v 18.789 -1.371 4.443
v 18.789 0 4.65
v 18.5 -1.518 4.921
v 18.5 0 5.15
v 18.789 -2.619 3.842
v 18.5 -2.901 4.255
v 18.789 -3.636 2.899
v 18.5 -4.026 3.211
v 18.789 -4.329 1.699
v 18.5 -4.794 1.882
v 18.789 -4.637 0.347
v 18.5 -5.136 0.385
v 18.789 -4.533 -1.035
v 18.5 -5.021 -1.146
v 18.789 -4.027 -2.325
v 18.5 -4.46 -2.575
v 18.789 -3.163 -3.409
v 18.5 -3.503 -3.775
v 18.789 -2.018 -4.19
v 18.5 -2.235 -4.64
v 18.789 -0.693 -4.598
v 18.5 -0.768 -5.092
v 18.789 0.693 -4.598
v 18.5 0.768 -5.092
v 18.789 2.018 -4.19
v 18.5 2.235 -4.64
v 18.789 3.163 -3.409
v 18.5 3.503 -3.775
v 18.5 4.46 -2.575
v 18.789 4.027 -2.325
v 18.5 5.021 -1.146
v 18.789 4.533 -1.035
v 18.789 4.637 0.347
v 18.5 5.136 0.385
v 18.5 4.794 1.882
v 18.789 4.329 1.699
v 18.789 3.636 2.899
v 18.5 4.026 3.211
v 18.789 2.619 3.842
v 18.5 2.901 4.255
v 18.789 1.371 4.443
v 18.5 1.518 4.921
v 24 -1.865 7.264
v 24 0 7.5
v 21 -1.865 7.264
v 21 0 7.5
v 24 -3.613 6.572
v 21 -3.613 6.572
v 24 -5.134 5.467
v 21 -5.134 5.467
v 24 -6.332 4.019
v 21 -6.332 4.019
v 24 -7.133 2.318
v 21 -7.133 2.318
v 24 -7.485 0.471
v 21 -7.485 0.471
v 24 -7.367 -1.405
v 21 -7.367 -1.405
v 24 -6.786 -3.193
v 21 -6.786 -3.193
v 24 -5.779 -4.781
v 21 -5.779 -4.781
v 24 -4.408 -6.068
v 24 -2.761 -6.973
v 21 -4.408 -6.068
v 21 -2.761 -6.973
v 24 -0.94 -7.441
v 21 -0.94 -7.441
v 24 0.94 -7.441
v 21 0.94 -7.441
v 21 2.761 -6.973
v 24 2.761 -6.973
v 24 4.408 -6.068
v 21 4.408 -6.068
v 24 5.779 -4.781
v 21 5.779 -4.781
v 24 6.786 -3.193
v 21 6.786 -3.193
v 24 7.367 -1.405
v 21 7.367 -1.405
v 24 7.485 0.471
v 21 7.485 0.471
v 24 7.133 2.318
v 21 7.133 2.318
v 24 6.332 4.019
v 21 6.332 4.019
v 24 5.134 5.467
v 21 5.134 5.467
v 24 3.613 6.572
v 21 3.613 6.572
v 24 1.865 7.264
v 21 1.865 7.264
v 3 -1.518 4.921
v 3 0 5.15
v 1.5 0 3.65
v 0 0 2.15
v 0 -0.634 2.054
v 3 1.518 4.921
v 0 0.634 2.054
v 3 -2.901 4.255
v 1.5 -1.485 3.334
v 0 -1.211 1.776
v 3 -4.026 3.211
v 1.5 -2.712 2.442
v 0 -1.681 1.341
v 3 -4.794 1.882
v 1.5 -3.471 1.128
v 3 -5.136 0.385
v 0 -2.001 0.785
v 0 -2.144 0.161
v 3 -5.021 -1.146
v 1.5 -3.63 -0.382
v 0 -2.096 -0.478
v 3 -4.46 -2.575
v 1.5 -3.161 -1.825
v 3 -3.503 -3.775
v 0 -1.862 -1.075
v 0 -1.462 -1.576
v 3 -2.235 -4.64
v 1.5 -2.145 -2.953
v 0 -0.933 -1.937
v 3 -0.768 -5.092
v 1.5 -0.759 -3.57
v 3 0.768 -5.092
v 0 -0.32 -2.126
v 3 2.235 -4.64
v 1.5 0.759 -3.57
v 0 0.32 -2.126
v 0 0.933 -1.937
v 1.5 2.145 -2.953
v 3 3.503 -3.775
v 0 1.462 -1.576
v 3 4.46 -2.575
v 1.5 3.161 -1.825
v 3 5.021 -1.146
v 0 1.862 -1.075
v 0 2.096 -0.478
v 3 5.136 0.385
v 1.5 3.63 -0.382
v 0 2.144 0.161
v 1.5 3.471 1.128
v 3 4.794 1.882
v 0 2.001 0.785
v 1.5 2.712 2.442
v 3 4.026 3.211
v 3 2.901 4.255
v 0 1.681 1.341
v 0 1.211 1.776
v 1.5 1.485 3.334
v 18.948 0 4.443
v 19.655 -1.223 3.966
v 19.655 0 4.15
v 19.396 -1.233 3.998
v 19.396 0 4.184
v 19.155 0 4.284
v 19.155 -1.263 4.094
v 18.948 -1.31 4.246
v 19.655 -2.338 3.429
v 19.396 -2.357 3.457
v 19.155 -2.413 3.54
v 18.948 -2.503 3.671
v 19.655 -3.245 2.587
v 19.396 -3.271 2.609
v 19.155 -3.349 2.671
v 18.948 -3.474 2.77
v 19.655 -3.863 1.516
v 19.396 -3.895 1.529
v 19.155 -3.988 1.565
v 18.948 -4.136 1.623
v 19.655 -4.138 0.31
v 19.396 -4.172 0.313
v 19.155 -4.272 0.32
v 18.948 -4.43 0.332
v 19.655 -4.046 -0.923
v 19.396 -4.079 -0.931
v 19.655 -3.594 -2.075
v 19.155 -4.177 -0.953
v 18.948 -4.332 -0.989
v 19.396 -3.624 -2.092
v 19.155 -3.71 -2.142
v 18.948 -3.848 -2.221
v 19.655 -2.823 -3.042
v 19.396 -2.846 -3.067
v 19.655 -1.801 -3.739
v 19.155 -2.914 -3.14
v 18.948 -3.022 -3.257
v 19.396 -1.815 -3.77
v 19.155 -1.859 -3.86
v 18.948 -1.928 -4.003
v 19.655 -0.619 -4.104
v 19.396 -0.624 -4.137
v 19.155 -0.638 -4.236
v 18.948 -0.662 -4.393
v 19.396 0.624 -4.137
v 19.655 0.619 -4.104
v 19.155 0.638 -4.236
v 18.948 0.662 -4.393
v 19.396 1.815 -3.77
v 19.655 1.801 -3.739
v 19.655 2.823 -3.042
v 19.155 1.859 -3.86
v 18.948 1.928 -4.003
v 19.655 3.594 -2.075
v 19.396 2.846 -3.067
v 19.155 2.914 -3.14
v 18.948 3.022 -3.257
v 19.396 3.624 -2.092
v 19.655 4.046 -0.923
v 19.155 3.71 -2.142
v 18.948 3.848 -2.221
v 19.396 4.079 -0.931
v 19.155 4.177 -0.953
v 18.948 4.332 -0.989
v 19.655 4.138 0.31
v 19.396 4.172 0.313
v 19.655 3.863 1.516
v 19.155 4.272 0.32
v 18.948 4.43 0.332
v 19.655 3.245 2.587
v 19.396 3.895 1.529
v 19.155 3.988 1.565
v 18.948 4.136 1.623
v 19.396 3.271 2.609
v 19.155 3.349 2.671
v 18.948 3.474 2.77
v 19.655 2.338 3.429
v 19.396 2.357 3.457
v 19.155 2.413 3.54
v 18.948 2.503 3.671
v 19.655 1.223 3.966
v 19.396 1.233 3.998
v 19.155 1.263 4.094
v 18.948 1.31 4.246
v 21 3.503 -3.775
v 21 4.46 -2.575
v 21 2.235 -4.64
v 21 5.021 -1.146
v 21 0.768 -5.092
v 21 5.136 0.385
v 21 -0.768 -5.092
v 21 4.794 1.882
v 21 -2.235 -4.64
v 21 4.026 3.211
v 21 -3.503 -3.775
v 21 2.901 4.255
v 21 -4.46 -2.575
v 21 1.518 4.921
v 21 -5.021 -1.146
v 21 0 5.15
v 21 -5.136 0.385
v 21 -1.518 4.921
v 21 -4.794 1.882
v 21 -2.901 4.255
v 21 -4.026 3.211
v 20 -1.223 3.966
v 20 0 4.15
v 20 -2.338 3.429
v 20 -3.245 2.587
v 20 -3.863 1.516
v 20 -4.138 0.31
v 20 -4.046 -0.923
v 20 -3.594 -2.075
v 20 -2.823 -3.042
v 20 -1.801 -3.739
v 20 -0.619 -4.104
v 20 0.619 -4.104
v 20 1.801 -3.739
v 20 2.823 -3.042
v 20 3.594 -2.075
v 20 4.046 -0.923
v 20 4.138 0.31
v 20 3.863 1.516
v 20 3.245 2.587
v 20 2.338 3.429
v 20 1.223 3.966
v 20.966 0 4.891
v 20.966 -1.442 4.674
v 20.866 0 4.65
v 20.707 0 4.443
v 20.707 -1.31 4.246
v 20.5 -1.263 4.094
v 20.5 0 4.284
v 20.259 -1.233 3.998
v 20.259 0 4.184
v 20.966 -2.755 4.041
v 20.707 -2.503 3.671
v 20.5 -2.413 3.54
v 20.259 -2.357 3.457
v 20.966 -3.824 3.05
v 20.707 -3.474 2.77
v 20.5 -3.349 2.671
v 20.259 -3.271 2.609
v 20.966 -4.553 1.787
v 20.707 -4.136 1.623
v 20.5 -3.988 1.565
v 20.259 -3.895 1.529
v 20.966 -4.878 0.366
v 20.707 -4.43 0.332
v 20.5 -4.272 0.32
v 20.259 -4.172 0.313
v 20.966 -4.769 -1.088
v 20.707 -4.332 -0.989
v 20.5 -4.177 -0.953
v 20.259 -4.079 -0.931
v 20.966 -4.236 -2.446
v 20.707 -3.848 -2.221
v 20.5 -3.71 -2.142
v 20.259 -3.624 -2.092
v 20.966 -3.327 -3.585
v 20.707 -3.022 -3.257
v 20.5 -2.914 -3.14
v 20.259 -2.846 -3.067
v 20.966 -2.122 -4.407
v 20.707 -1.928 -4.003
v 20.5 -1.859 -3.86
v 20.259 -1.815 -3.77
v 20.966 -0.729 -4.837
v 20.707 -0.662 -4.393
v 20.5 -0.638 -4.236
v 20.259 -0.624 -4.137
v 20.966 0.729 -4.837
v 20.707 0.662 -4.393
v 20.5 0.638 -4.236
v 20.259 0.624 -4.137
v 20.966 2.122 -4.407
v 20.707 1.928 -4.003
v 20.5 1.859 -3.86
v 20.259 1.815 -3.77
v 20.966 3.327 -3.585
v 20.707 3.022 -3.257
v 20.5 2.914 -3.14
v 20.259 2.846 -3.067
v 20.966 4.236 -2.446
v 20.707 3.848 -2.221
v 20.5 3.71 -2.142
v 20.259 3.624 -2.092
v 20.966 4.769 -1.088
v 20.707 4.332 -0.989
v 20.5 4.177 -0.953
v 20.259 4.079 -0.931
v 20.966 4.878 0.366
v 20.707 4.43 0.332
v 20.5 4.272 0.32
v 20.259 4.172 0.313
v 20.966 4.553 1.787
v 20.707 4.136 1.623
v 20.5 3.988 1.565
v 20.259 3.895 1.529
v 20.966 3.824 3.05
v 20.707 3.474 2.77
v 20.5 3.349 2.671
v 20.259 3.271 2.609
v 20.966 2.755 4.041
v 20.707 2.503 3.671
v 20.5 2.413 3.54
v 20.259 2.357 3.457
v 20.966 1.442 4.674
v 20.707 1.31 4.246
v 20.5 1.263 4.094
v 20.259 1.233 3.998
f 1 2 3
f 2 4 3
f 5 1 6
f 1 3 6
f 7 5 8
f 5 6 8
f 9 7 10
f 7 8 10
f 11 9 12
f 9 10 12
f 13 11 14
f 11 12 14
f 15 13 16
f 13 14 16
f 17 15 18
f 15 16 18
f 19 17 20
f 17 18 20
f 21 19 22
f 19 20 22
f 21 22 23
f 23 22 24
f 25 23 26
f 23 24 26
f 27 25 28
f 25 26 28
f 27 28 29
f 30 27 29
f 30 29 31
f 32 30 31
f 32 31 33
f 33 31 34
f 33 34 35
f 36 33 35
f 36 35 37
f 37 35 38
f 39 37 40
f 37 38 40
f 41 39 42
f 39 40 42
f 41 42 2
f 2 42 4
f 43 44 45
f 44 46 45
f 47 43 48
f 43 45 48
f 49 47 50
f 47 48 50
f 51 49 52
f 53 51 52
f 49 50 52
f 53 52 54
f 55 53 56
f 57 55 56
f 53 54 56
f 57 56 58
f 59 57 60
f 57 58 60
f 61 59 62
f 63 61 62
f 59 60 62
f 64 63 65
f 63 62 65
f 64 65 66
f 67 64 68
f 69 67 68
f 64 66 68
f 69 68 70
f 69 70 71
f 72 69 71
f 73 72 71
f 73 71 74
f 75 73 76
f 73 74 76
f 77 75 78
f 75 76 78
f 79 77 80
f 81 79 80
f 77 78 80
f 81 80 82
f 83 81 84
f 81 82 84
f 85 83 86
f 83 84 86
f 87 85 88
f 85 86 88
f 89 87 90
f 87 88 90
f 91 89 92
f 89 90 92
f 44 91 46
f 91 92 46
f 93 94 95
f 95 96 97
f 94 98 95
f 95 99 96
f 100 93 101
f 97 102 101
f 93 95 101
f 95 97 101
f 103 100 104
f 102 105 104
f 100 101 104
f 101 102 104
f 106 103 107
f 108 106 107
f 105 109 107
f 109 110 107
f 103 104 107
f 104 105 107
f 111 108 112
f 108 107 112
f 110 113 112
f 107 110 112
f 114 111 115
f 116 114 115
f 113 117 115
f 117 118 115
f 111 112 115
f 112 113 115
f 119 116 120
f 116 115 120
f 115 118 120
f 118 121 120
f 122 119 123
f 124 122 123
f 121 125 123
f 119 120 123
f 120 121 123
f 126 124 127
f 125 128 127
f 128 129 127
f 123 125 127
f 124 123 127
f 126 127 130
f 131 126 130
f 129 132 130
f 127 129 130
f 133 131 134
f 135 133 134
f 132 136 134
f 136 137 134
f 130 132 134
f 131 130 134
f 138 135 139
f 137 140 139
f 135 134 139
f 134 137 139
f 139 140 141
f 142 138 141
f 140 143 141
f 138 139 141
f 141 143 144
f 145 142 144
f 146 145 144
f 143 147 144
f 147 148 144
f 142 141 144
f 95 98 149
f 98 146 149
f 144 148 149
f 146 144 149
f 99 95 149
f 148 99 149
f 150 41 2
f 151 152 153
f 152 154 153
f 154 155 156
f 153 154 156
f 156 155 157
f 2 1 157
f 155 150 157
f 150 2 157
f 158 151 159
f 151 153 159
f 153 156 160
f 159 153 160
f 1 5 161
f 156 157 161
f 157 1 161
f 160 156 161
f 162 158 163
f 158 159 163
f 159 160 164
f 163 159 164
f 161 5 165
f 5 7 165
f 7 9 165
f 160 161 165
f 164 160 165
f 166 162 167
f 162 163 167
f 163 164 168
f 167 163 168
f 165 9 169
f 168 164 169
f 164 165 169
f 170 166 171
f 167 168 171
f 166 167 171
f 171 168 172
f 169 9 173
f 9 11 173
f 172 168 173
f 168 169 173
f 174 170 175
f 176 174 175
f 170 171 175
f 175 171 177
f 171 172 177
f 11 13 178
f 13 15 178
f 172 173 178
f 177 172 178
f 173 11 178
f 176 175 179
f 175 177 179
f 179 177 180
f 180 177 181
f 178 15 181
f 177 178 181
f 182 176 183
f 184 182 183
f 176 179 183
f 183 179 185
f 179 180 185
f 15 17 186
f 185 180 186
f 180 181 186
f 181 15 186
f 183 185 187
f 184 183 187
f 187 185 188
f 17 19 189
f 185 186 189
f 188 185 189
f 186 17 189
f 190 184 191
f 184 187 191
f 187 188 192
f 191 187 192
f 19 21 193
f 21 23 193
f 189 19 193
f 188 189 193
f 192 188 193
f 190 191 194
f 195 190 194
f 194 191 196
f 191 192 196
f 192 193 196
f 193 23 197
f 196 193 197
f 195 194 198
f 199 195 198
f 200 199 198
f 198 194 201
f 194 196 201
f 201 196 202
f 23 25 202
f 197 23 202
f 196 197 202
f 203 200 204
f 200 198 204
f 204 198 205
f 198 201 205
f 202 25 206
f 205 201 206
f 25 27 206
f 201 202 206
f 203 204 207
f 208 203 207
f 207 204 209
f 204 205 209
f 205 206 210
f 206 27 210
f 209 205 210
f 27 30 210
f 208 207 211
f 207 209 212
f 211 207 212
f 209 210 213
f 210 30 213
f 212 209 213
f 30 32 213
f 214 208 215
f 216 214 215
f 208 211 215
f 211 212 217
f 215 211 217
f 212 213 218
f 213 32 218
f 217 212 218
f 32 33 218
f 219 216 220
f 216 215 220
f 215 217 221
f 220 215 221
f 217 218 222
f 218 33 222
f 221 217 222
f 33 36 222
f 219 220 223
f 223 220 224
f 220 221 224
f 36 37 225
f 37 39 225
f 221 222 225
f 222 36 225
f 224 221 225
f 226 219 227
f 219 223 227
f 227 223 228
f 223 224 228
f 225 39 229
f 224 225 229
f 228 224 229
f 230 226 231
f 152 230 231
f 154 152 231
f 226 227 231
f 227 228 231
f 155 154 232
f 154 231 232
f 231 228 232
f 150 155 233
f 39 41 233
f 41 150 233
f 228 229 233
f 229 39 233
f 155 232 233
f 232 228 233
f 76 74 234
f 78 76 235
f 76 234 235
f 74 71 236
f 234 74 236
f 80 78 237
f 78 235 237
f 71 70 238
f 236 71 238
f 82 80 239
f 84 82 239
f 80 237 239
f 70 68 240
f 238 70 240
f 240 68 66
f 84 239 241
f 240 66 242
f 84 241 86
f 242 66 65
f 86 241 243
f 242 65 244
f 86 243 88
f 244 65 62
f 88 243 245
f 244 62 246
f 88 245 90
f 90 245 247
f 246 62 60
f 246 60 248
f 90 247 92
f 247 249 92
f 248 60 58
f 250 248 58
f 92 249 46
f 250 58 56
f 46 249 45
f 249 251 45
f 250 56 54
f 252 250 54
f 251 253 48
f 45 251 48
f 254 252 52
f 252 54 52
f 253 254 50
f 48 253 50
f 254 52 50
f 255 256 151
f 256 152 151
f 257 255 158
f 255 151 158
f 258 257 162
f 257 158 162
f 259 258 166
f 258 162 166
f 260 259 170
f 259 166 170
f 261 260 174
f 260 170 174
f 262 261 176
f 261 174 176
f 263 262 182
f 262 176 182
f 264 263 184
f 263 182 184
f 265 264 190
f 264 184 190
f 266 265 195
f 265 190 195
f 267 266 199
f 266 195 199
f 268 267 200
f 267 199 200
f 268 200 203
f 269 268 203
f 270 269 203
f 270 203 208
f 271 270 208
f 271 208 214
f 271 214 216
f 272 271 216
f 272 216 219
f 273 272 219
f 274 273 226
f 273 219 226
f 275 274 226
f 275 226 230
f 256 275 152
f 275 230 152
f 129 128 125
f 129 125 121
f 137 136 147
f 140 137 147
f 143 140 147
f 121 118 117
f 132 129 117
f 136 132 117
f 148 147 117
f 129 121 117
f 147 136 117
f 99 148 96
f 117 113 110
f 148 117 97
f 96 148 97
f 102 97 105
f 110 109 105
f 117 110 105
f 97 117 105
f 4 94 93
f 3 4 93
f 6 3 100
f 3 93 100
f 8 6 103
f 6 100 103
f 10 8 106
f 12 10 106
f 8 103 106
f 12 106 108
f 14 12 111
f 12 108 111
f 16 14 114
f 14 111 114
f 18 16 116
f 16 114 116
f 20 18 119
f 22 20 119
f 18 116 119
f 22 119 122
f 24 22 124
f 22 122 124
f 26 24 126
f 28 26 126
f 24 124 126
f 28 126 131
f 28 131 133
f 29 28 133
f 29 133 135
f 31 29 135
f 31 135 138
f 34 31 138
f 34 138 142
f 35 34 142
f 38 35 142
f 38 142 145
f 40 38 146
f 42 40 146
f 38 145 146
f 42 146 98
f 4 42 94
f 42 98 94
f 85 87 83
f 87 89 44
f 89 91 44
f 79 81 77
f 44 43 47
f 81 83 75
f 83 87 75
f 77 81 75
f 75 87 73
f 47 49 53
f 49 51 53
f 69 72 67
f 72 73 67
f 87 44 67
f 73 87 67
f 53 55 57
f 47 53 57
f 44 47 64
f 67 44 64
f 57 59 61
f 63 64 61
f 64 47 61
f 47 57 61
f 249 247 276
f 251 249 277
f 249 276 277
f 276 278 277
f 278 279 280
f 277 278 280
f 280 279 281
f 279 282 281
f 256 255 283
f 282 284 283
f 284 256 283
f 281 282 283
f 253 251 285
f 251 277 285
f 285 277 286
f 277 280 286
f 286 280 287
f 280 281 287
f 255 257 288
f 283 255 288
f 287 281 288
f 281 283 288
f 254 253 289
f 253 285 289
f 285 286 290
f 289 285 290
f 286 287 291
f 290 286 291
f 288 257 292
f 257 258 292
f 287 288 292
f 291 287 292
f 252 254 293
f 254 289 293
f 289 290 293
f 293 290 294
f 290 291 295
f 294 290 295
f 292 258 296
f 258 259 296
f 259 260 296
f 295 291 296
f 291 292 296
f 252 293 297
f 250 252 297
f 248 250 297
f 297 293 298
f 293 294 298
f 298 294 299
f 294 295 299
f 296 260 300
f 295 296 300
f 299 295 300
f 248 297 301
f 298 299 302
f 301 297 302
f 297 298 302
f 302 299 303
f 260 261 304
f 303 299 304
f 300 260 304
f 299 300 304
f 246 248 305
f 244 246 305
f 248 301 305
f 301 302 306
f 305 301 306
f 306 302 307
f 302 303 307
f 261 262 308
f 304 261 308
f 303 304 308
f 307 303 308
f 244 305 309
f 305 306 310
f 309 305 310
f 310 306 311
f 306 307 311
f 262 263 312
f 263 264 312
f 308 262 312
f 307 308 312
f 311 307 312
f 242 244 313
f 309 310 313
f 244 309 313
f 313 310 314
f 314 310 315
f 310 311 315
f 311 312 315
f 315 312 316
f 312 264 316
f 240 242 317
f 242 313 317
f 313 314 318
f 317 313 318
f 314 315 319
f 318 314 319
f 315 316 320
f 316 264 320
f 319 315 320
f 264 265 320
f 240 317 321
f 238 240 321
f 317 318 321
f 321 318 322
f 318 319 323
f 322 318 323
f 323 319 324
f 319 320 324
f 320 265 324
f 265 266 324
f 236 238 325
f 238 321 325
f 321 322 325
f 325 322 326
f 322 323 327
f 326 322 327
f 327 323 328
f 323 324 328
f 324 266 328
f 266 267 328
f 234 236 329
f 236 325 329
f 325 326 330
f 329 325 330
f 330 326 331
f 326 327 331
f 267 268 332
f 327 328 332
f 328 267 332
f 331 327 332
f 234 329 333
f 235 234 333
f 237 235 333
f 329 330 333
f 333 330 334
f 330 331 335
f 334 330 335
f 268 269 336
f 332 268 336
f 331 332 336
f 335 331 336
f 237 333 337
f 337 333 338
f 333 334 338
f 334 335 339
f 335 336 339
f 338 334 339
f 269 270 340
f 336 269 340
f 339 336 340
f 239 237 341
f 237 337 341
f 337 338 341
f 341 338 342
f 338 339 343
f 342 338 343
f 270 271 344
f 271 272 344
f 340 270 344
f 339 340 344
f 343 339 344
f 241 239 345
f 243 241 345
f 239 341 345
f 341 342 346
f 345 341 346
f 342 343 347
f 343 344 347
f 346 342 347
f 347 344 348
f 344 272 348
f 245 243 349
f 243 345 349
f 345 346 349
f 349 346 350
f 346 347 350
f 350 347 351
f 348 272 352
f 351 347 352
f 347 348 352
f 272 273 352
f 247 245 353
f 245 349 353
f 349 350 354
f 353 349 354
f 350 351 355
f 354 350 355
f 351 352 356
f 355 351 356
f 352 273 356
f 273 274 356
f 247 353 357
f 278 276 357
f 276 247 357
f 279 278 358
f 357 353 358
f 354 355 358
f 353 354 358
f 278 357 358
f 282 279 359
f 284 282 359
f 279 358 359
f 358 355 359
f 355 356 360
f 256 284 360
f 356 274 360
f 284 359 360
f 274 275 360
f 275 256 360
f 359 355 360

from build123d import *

# Parameters (mm, degrees)
F2_SIZE2 = 3
F2_SIZE  = 3


with BuildPart() as f1:
    # F0 (on Front) → F1 (revolve)
    with BuildSketch(Plane.XZ):
        with BuildLine():
            Line((18.5, 5.15), (0, 5.15))
            Line((0, 5.15), (0, 0))
            Line((0, 0), (24, 0))
            Line((24, 0), (24, 7.5))
            Line((24, 7.5), (21, 7.5))
            Line((21, 7.5), (21, 5.15))
            ThreePointArc((21, 5.15), (20.707107, 4.442893), (20, 4.15))
            Line((20, 4.15), (19.654701, 4.15))
            ThreePointArc((19.654701, 4.15), (19.154701, 4.283975), (18.788675, 4.65))
            Line((18.788675, 4.65), (18.5, 5.15))
        make_face()
    revolve(axis=Axis((12.35421, 0, 0), (1, 0, 0)))

    # F2
    f2_edges = [f1.edges().sort_by_distance(p)[0] for p in [
        (0, 0, -5.15),
    ]]
    chamfer(f2_edges, length=F2_SIZE, length2=F2_SIZE2)


solid = f1.part
